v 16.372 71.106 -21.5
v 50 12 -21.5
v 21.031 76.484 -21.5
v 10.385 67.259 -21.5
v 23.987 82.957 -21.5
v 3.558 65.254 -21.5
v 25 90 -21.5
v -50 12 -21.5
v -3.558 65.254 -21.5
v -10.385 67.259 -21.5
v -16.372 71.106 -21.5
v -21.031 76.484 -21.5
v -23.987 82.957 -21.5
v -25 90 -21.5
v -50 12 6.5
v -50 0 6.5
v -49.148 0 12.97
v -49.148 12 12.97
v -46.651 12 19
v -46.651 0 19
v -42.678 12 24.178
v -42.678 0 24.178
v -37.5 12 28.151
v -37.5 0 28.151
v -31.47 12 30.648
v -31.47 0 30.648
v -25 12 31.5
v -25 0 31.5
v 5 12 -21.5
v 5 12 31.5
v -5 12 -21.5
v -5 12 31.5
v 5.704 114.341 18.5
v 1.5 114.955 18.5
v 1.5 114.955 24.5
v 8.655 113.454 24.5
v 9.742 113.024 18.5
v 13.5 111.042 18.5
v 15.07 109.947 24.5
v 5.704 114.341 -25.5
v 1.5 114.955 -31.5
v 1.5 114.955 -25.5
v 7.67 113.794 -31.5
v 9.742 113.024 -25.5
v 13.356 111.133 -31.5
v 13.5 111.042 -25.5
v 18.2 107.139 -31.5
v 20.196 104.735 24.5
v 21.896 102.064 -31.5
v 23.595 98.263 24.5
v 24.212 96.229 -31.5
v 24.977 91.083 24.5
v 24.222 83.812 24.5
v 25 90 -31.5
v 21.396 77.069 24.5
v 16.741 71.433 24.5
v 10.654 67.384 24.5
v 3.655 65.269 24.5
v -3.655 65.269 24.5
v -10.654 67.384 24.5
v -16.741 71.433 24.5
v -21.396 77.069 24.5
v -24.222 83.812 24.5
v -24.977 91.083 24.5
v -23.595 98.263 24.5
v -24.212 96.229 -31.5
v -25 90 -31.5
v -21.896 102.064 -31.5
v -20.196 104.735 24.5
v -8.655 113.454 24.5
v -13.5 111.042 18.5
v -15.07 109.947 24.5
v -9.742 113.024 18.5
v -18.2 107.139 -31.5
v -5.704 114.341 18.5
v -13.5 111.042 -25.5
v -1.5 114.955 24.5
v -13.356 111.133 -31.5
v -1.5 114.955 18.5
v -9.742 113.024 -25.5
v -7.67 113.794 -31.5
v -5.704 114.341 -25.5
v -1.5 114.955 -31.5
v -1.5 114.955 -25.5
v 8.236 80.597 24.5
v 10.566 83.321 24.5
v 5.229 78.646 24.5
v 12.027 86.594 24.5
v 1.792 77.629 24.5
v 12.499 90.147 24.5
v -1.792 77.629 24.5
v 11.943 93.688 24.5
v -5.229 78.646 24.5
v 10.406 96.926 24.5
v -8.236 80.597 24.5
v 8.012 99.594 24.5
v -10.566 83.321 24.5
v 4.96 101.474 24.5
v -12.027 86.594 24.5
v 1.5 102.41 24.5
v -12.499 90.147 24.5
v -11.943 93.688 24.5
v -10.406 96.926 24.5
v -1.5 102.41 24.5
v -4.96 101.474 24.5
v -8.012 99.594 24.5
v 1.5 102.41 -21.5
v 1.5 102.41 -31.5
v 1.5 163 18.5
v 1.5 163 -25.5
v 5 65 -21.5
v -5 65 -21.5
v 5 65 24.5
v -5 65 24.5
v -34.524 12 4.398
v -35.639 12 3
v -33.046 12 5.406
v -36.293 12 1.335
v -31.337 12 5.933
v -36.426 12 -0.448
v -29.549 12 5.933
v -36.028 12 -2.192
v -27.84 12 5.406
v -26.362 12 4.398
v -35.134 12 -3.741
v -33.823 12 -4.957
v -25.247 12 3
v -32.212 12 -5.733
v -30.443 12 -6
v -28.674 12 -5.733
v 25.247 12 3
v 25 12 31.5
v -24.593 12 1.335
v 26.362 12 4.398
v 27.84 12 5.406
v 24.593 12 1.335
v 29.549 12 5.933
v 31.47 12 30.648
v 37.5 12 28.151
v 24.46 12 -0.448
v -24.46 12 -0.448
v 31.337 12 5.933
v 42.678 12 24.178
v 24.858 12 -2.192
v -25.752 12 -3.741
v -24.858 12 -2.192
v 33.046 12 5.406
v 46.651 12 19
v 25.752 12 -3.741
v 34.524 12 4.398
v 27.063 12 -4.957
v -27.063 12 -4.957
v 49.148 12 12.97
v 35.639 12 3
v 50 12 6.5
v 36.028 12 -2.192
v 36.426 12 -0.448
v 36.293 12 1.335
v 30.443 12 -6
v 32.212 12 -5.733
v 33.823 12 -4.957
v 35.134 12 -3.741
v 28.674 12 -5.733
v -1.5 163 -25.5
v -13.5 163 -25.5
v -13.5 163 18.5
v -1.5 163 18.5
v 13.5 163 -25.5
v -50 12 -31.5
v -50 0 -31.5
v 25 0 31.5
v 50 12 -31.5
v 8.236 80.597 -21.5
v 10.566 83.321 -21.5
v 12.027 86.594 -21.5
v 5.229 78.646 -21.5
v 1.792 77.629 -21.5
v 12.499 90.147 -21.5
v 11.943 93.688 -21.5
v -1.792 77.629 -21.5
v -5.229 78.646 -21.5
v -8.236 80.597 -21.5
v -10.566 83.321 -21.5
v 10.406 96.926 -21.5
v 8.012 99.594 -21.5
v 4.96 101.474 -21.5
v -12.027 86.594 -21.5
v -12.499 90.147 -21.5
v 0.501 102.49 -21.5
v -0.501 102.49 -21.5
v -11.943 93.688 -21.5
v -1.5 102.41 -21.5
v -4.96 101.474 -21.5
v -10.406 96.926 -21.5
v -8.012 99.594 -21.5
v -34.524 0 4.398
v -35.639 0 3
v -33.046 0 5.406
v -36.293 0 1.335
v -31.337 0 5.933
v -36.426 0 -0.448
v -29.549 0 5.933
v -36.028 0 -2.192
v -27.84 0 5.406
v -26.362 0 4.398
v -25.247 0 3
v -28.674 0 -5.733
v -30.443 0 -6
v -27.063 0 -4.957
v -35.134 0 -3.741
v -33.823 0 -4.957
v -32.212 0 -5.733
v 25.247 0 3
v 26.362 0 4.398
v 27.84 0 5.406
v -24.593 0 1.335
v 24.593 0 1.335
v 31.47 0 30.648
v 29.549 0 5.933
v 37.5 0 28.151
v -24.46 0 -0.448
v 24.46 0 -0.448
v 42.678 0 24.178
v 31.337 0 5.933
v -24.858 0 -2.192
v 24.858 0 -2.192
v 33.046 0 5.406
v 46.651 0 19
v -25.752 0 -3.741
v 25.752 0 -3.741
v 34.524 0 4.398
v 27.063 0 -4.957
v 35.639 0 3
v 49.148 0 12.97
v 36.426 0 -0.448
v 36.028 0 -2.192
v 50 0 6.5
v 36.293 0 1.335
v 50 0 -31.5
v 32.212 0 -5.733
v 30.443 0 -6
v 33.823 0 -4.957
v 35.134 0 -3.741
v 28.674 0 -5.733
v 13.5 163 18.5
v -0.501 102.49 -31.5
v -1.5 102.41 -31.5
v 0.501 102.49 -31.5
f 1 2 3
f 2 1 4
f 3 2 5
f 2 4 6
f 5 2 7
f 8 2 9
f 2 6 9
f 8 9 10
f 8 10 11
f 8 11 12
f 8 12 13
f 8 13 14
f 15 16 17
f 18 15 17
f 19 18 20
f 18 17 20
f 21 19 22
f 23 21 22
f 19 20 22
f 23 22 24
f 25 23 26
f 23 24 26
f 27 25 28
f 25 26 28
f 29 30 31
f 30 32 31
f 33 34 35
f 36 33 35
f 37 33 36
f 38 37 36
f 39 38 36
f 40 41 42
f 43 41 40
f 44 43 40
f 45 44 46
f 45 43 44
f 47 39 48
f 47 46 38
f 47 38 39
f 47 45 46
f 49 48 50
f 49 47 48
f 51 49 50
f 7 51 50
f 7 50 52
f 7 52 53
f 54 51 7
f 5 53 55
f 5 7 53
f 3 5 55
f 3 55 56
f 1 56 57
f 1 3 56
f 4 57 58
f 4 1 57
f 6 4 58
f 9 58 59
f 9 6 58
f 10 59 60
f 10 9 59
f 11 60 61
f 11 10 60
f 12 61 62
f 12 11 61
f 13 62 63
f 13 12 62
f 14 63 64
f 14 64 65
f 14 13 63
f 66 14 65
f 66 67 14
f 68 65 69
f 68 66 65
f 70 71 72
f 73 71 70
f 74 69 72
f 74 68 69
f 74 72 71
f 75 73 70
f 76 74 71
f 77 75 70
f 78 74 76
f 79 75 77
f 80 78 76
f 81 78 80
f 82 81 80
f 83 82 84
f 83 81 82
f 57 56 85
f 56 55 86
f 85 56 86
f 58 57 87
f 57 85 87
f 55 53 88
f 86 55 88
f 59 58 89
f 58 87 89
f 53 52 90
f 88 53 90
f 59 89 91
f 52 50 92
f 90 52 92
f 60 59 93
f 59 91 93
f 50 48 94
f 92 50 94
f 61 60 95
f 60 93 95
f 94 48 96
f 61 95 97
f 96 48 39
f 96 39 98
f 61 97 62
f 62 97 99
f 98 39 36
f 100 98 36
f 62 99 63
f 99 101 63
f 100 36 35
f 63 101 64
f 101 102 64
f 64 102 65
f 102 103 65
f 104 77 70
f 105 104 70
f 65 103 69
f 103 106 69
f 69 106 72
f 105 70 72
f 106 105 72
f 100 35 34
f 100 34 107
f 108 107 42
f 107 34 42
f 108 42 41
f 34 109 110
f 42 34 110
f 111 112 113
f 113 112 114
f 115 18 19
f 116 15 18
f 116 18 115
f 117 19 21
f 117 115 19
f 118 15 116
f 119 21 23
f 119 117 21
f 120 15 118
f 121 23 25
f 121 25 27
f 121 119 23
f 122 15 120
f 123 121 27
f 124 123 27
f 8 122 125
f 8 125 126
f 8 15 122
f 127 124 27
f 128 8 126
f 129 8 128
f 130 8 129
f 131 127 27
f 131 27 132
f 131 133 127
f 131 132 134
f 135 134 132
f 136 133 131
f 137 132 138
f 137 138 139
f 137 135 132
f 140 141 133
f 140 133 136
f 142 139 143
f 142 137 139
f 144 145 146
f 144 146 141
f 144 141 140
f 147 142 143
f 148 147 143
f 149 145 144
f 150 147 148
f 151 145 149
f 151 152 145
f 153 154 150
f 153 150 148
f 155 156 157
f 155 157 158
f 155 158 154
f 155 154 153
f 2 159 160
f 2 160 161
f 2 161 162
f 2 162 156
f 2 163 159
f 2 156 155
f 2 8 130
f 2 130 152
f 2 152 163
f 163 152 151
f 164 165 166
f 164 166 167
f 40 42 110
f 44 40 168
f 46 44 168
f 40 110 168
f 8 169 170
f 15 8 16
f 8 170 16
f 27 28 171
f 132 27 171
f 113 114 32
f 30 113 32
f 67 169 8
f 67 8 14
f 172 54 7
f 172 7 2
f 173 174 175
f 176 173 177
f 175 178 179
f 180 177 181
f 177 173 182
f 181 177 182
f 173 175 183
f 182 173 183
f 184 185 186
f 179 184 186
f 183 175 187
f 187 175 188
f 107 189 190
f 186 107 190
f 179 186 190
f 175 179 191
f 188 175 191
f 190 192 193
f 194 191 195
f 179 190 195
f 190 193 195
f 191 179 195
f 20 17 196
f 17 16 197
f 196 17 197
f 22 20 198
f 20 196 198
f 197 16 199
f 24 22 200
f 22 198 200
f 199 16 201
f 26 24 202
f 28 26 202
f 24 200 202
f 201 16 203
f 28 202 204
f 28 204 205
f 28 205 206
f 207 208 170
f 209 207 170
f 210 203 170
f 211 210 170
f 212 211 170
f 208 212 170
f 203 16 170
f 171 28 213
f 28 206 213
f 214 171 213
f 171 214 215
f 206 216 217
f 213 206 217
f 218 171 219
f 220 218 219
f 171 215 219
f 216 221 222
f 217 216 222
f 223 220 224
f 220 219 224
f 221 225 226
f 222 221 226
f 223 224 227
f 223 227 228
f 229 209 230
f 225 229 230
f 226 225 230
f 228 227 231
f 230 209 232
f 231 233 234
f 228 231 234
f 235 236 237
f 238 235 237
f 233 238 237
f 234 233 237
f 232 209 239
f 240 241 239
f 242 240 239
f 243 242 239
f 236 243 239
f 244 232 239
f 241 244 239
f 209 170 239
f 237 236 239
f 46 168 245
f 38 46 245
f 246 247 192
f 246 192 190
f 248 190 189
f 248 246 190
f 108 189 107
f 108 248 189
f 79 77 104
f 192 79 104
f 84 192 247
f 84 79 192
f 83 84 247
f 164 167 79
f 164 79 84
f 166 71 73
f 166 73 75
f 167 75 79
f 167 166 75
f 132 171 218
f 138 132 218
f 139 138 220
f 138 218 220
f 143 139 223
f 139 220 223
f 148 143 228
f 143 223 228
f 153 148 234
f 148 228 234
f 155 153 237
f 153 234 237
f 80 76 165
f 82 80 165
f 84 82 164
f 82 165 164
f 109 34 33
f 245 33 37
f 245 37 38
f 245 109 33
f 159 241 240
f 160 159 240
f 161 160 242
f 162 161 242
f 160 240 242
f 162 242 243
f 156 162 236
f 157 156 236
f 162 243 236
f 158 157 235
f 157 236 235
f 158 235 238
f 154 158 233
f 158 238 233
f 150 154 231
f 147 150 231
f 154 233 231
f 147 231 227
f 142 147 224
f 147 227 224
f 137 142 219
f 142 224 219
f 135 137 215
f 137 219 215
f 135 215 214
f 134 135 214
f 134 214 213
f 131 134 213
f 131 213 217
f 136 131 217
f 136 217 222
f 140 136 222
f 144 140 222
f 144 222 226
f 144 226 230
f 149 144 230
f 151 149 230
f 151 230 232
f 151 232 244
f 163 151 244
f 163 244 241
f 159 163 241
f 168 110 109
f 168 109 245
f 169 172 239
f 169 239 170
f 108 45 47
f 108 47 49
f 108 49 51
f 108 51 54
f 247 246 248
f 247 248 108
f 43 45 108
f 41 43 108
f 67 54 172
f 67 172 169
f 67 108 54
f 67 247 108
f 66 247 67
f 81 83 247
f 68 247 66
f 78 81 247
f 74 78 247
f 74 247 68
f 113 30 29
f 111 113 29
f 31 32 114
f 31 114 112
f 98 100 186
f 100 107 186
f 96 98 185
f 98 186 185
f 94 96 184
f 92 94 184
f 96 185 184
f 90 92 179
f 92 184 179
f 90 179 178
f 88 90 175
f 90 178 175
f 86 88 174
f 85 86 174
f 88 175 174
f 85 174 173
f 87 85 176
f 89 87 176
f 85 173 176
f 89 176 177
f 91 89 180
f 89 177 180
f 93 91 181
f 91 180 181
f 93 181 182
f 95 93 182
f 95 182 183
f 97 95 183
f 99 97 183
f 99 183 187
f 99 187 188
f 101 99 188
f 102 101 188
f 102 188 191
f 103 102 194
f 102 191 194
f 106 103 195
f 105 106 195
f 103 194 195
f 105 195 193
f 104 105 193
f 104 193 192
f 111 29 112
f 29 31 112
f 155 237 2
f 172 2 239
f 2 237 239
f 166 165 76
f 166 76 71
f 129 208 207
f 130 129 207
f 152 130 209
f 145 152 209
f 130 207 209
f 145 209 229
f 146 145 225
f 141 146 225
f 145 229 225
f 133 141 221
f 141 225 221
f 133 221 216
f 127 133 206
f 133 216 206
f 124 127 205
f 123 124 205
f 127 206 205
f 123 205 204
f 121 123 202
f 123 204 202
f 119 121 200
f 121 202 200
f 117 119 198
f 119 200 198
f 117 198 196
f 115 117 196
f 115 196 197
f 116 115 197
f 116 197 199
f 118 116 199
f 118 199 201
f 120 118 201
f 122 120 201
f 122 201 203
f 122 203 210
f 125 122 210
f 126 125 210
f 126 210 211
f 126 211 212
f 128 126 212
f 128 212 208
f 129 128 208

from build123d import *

# Parameters (mm, degrees)
BOSS_EXTRUDE1_DEPTH            = 12
SKETCH3_R                      = 25
SKETCH3_R_2                    = 12.5
BOSS_EXTRUDE2_DEPTH            = 56
BOSS_EXTRUDE5_DEPTH            = 10
CUT_EXTRUDE1_REACH             = 131.295
SKETCH7_R                      = 6
BOSS_EXTRUDE8_DEPTH            = 5
SKETCH10_W                     = 27
SKETCH10_H                     = 44
BOSS_EXTRUDE9_DEPTH            = 48
BOSS_EXTRUDE10_REACH           = 131.295
BOSS_EXTRUDE10_END_RADIUS      = 25
SKETCH11_W                     = 27
SKETCH11_H                     = 44
CUT_EXTRUDE4_REACH             = 131.295
CUT_EXTRUDE4_END_RADIUS        = 12.5
SKETCH14_W                     = 3
SKETCH14_H                     = 58.243976523
CUT_EXTRUDE4_DIRECTION_2_DEPTH = 130.295204861


with BuildPart() as part:
    # Sketch2 → Boss-Extrude1 (new body)
    with BuildSketch(Plane(origin=(0, 0, 0), x_dir=(1, 0, 0), z_dir=(0, 1, 0))):
        with BuildLine():
            Line((-25, -31.5), (25, -31.5))
            ThreePointArc((25, -31.5), (42.67766953, -24.17766953), (50, -6.5))
            Line((50, -6.5), (50, 31.5))
            Line((50, 31.5), (-50, 31.5))
            Line((-50, 31.5), (-50, -6.5))
            ThreePointArc((-50, -6.5), (-42.67766953, -24.17766953), (-25, -31.5))
        make_face()
    extrude(amount=BOSS_EXTRUDE1_DEPTH)



with BuildPart() as body_2:
    # Sketch3 → Boss-Extrude2 (new body)
    with BuildSketch(Plane(origin=(0, 0, -31.5), x_dir=(-1, 0, 0), z_dir=(0, 0, -1))):
        with Locations((0, 90)):
            Circle(SKETCH3_R)
        with Locations((0, 90)):
            Circle(SKETCH3_R_2, mode=Mode.SUBTRACT)
    extrude(amount=-BOSS_EXTRUDE2_DEPTH)


with BuildPart() as part_1:
    add(part.part)

    add(body_2.part)  # Boss-Extrude5 merges body 2
    # Sketch5 → Boss-Extrude5 (add)
    with BuildSketch(Plane(origin=(0, 0, -31.5), x_dir=(-1, 0, 0), z_dir=(0, 0, -1))):
        with BuildLine():
            Line((-25, 90), (-50, 12))
            Line((-50, 12), (50, 12))
            Line((50, 12), (25, 90))
            ThreePointArc((25, 90), (0, 115), (-25, 90))
        make_face()
    extrude(amount=-BOSS_EXTRUDE5_DEPTH)

    # Sketch7 → Cut-Extrude1 (cut, up to next)
    with BuildSketch(Plane(origin=(0, 0, 0), x_dir=(-1, 0, 0), z_dir=(0, -1, 0)), mode=Mode.PRIVATE) as cut_extrude1_sk1:
        with Locations(Location((-30.442997097, 0, 0), (0, 0, 90))):
            Circle(SKETCH7_R)
    cut_extrude1_tool1 = extrude(cut_extrude1_sk1.sketch, amount=-CUT_EXTRUDE1_REACH, mode=Mode.PRIVATE) & part_1.part
    # Sketch7 → Cut-Extrude1 (cut, up to next)
    with BuildSketch(Plane(origin=(0, 0, 0), x_dir=(-1, 0, 0), z_dir=(0, -1, 0)), mode=Mode.PRIVATE) as cut_extrude1_sk2:
        with Locations(Location((30.442997097, 0, 0), (0, 0, 90))):
            Circle(SKETCH7_R)
    cut_extrude1_tool2 = extrude(cut_extrude1_sk2.sketch, amount=-CUT_EXTRUDE1_REACH, mode=Mode.PRIVATE) & part_1.part
    add(cut_extrude1_tool1.solids().sort_by_distance((30.442997, 0, 0))[0], mode=Mode.SUBTRACT)
    add(cut_extrude1_tool2.solids().sort_by_distance((-30.442997, 0, 0))[0], mode=Mode.SUBTRACT)



with BuildPart() as body_2_2:
    # Sketch8 → Boss-Extrude8 (new, symmetric)
    with BuildSketch(Plane.ZY):
        Polygon((24.5, 65), (31.5, 12), (-21.5, 12), (-21.5, 65), align=None)
    extrude(amount=BOSS_EXTRUDE8_DEPTH, both=True)


with BuildPart() as body_3:
    # Sketch10 → Boss-Extrude9 (new body)
    with BuildSketch(Plane(origin=(0, 115, 0), x_dir=(1, 0, 0), z_dir=(0, 1, 0))):
        with Locations((0, 3.5)):
            Rectangle(SKETCH10_W, SKETCH10_H)
    extrude(amount=BOSS_EXTRUDE9_DEPTH)


with BuildPart() as part_2:
    add(part_1.part)

    add(body_3.part)  # Boss-Extrude10 merges body 3
    # Boss-Extrude10: up to this cylinder (the profile starts outside it)
    boss_extrude10_end = Plane(origin=(0, 90, -3.5), z_dir=(0, 0, -1)) * Cylinder(BOSS_EXTRUDE10_END_RADIUS, 313.59, mode=Mode.PRIVATE)
    # Sketch11 → Boss-Extrude10 (add, up to the surface)
    with BuildSketch(Plane.XZ.offset(-115), mode=Mode.PRIVATE) as boss_extrude10_sk1:
        with Locations((0, -3.5)):
            Rectangle(SKETCH11_W, SKETCH11_H)
    boss_extrude10_tool1 = extrude(boss_extrude10_sk1.sketch, amount=BOSS_EXTRUDE10_REACH, mode=Mode.PRIVATE) - boss_extrude10_end
    add(boss_extrude10_tool1.solids().sort_by_distance((0, 115, -3.5))[0])
    add(boss_extrude10_tool1.solids().sort_by_distance((0, 115, -3.5))[1])

    # Cut-Extrude4: up to this cylinder (the profile starts outside it)
    cut_extrude4_end = Plane(origin=(0, 90, -2.378012), z_dir=(0, 0, -1)) * Cylinder(CUT_EXTRUDE4_END_RADIUS, 288.59, mode=Mode.PRIVATE)
    # Sketch14 → Cut-Extrude4 (cut, up to the surface)
    with BuildSketch(Plane(origin=(0, 115, 0), x_dir=(1, 0, 0), z_dir=(0, 1, 0)), mode=Mode.PRIVATE) as cut_extrude4_sk1:
        with Locations((0, 2.378011739)):
            Rectangle(SKETCH14_W, SKETCH14_H)
    cut_extrude4_tool1 = extrude(cut_extrude4_sk1.sketch, amount=-CUT_EXTRUDE4_REACH, mode=Mode.PRIVATE) - cut_extrude4_end
    add(cut_extrude4_tool1.solids().sort_by_distance((0, 115, -2.378012))[0], mode=Mode.SUBTRACT)

    # Sketch14 → Cut-Extrude4 direction 2 (cut)
    with BuildSketch(Plane(origin=(0, 115, 0), x_dir=(1, 0, 0), z_dir=(0, 1, 0))):
        with Locations((0, 2.378011739)):
            Rectangle(SKETCH14_W, SKETCH14_H)
    extrude(amount=CUT_EXTRUDE4_DIRECTION_2_DEPTH, mode=Mode.SUBTRACT)


solid = Compound([body_2_2.part, part_2.part])
